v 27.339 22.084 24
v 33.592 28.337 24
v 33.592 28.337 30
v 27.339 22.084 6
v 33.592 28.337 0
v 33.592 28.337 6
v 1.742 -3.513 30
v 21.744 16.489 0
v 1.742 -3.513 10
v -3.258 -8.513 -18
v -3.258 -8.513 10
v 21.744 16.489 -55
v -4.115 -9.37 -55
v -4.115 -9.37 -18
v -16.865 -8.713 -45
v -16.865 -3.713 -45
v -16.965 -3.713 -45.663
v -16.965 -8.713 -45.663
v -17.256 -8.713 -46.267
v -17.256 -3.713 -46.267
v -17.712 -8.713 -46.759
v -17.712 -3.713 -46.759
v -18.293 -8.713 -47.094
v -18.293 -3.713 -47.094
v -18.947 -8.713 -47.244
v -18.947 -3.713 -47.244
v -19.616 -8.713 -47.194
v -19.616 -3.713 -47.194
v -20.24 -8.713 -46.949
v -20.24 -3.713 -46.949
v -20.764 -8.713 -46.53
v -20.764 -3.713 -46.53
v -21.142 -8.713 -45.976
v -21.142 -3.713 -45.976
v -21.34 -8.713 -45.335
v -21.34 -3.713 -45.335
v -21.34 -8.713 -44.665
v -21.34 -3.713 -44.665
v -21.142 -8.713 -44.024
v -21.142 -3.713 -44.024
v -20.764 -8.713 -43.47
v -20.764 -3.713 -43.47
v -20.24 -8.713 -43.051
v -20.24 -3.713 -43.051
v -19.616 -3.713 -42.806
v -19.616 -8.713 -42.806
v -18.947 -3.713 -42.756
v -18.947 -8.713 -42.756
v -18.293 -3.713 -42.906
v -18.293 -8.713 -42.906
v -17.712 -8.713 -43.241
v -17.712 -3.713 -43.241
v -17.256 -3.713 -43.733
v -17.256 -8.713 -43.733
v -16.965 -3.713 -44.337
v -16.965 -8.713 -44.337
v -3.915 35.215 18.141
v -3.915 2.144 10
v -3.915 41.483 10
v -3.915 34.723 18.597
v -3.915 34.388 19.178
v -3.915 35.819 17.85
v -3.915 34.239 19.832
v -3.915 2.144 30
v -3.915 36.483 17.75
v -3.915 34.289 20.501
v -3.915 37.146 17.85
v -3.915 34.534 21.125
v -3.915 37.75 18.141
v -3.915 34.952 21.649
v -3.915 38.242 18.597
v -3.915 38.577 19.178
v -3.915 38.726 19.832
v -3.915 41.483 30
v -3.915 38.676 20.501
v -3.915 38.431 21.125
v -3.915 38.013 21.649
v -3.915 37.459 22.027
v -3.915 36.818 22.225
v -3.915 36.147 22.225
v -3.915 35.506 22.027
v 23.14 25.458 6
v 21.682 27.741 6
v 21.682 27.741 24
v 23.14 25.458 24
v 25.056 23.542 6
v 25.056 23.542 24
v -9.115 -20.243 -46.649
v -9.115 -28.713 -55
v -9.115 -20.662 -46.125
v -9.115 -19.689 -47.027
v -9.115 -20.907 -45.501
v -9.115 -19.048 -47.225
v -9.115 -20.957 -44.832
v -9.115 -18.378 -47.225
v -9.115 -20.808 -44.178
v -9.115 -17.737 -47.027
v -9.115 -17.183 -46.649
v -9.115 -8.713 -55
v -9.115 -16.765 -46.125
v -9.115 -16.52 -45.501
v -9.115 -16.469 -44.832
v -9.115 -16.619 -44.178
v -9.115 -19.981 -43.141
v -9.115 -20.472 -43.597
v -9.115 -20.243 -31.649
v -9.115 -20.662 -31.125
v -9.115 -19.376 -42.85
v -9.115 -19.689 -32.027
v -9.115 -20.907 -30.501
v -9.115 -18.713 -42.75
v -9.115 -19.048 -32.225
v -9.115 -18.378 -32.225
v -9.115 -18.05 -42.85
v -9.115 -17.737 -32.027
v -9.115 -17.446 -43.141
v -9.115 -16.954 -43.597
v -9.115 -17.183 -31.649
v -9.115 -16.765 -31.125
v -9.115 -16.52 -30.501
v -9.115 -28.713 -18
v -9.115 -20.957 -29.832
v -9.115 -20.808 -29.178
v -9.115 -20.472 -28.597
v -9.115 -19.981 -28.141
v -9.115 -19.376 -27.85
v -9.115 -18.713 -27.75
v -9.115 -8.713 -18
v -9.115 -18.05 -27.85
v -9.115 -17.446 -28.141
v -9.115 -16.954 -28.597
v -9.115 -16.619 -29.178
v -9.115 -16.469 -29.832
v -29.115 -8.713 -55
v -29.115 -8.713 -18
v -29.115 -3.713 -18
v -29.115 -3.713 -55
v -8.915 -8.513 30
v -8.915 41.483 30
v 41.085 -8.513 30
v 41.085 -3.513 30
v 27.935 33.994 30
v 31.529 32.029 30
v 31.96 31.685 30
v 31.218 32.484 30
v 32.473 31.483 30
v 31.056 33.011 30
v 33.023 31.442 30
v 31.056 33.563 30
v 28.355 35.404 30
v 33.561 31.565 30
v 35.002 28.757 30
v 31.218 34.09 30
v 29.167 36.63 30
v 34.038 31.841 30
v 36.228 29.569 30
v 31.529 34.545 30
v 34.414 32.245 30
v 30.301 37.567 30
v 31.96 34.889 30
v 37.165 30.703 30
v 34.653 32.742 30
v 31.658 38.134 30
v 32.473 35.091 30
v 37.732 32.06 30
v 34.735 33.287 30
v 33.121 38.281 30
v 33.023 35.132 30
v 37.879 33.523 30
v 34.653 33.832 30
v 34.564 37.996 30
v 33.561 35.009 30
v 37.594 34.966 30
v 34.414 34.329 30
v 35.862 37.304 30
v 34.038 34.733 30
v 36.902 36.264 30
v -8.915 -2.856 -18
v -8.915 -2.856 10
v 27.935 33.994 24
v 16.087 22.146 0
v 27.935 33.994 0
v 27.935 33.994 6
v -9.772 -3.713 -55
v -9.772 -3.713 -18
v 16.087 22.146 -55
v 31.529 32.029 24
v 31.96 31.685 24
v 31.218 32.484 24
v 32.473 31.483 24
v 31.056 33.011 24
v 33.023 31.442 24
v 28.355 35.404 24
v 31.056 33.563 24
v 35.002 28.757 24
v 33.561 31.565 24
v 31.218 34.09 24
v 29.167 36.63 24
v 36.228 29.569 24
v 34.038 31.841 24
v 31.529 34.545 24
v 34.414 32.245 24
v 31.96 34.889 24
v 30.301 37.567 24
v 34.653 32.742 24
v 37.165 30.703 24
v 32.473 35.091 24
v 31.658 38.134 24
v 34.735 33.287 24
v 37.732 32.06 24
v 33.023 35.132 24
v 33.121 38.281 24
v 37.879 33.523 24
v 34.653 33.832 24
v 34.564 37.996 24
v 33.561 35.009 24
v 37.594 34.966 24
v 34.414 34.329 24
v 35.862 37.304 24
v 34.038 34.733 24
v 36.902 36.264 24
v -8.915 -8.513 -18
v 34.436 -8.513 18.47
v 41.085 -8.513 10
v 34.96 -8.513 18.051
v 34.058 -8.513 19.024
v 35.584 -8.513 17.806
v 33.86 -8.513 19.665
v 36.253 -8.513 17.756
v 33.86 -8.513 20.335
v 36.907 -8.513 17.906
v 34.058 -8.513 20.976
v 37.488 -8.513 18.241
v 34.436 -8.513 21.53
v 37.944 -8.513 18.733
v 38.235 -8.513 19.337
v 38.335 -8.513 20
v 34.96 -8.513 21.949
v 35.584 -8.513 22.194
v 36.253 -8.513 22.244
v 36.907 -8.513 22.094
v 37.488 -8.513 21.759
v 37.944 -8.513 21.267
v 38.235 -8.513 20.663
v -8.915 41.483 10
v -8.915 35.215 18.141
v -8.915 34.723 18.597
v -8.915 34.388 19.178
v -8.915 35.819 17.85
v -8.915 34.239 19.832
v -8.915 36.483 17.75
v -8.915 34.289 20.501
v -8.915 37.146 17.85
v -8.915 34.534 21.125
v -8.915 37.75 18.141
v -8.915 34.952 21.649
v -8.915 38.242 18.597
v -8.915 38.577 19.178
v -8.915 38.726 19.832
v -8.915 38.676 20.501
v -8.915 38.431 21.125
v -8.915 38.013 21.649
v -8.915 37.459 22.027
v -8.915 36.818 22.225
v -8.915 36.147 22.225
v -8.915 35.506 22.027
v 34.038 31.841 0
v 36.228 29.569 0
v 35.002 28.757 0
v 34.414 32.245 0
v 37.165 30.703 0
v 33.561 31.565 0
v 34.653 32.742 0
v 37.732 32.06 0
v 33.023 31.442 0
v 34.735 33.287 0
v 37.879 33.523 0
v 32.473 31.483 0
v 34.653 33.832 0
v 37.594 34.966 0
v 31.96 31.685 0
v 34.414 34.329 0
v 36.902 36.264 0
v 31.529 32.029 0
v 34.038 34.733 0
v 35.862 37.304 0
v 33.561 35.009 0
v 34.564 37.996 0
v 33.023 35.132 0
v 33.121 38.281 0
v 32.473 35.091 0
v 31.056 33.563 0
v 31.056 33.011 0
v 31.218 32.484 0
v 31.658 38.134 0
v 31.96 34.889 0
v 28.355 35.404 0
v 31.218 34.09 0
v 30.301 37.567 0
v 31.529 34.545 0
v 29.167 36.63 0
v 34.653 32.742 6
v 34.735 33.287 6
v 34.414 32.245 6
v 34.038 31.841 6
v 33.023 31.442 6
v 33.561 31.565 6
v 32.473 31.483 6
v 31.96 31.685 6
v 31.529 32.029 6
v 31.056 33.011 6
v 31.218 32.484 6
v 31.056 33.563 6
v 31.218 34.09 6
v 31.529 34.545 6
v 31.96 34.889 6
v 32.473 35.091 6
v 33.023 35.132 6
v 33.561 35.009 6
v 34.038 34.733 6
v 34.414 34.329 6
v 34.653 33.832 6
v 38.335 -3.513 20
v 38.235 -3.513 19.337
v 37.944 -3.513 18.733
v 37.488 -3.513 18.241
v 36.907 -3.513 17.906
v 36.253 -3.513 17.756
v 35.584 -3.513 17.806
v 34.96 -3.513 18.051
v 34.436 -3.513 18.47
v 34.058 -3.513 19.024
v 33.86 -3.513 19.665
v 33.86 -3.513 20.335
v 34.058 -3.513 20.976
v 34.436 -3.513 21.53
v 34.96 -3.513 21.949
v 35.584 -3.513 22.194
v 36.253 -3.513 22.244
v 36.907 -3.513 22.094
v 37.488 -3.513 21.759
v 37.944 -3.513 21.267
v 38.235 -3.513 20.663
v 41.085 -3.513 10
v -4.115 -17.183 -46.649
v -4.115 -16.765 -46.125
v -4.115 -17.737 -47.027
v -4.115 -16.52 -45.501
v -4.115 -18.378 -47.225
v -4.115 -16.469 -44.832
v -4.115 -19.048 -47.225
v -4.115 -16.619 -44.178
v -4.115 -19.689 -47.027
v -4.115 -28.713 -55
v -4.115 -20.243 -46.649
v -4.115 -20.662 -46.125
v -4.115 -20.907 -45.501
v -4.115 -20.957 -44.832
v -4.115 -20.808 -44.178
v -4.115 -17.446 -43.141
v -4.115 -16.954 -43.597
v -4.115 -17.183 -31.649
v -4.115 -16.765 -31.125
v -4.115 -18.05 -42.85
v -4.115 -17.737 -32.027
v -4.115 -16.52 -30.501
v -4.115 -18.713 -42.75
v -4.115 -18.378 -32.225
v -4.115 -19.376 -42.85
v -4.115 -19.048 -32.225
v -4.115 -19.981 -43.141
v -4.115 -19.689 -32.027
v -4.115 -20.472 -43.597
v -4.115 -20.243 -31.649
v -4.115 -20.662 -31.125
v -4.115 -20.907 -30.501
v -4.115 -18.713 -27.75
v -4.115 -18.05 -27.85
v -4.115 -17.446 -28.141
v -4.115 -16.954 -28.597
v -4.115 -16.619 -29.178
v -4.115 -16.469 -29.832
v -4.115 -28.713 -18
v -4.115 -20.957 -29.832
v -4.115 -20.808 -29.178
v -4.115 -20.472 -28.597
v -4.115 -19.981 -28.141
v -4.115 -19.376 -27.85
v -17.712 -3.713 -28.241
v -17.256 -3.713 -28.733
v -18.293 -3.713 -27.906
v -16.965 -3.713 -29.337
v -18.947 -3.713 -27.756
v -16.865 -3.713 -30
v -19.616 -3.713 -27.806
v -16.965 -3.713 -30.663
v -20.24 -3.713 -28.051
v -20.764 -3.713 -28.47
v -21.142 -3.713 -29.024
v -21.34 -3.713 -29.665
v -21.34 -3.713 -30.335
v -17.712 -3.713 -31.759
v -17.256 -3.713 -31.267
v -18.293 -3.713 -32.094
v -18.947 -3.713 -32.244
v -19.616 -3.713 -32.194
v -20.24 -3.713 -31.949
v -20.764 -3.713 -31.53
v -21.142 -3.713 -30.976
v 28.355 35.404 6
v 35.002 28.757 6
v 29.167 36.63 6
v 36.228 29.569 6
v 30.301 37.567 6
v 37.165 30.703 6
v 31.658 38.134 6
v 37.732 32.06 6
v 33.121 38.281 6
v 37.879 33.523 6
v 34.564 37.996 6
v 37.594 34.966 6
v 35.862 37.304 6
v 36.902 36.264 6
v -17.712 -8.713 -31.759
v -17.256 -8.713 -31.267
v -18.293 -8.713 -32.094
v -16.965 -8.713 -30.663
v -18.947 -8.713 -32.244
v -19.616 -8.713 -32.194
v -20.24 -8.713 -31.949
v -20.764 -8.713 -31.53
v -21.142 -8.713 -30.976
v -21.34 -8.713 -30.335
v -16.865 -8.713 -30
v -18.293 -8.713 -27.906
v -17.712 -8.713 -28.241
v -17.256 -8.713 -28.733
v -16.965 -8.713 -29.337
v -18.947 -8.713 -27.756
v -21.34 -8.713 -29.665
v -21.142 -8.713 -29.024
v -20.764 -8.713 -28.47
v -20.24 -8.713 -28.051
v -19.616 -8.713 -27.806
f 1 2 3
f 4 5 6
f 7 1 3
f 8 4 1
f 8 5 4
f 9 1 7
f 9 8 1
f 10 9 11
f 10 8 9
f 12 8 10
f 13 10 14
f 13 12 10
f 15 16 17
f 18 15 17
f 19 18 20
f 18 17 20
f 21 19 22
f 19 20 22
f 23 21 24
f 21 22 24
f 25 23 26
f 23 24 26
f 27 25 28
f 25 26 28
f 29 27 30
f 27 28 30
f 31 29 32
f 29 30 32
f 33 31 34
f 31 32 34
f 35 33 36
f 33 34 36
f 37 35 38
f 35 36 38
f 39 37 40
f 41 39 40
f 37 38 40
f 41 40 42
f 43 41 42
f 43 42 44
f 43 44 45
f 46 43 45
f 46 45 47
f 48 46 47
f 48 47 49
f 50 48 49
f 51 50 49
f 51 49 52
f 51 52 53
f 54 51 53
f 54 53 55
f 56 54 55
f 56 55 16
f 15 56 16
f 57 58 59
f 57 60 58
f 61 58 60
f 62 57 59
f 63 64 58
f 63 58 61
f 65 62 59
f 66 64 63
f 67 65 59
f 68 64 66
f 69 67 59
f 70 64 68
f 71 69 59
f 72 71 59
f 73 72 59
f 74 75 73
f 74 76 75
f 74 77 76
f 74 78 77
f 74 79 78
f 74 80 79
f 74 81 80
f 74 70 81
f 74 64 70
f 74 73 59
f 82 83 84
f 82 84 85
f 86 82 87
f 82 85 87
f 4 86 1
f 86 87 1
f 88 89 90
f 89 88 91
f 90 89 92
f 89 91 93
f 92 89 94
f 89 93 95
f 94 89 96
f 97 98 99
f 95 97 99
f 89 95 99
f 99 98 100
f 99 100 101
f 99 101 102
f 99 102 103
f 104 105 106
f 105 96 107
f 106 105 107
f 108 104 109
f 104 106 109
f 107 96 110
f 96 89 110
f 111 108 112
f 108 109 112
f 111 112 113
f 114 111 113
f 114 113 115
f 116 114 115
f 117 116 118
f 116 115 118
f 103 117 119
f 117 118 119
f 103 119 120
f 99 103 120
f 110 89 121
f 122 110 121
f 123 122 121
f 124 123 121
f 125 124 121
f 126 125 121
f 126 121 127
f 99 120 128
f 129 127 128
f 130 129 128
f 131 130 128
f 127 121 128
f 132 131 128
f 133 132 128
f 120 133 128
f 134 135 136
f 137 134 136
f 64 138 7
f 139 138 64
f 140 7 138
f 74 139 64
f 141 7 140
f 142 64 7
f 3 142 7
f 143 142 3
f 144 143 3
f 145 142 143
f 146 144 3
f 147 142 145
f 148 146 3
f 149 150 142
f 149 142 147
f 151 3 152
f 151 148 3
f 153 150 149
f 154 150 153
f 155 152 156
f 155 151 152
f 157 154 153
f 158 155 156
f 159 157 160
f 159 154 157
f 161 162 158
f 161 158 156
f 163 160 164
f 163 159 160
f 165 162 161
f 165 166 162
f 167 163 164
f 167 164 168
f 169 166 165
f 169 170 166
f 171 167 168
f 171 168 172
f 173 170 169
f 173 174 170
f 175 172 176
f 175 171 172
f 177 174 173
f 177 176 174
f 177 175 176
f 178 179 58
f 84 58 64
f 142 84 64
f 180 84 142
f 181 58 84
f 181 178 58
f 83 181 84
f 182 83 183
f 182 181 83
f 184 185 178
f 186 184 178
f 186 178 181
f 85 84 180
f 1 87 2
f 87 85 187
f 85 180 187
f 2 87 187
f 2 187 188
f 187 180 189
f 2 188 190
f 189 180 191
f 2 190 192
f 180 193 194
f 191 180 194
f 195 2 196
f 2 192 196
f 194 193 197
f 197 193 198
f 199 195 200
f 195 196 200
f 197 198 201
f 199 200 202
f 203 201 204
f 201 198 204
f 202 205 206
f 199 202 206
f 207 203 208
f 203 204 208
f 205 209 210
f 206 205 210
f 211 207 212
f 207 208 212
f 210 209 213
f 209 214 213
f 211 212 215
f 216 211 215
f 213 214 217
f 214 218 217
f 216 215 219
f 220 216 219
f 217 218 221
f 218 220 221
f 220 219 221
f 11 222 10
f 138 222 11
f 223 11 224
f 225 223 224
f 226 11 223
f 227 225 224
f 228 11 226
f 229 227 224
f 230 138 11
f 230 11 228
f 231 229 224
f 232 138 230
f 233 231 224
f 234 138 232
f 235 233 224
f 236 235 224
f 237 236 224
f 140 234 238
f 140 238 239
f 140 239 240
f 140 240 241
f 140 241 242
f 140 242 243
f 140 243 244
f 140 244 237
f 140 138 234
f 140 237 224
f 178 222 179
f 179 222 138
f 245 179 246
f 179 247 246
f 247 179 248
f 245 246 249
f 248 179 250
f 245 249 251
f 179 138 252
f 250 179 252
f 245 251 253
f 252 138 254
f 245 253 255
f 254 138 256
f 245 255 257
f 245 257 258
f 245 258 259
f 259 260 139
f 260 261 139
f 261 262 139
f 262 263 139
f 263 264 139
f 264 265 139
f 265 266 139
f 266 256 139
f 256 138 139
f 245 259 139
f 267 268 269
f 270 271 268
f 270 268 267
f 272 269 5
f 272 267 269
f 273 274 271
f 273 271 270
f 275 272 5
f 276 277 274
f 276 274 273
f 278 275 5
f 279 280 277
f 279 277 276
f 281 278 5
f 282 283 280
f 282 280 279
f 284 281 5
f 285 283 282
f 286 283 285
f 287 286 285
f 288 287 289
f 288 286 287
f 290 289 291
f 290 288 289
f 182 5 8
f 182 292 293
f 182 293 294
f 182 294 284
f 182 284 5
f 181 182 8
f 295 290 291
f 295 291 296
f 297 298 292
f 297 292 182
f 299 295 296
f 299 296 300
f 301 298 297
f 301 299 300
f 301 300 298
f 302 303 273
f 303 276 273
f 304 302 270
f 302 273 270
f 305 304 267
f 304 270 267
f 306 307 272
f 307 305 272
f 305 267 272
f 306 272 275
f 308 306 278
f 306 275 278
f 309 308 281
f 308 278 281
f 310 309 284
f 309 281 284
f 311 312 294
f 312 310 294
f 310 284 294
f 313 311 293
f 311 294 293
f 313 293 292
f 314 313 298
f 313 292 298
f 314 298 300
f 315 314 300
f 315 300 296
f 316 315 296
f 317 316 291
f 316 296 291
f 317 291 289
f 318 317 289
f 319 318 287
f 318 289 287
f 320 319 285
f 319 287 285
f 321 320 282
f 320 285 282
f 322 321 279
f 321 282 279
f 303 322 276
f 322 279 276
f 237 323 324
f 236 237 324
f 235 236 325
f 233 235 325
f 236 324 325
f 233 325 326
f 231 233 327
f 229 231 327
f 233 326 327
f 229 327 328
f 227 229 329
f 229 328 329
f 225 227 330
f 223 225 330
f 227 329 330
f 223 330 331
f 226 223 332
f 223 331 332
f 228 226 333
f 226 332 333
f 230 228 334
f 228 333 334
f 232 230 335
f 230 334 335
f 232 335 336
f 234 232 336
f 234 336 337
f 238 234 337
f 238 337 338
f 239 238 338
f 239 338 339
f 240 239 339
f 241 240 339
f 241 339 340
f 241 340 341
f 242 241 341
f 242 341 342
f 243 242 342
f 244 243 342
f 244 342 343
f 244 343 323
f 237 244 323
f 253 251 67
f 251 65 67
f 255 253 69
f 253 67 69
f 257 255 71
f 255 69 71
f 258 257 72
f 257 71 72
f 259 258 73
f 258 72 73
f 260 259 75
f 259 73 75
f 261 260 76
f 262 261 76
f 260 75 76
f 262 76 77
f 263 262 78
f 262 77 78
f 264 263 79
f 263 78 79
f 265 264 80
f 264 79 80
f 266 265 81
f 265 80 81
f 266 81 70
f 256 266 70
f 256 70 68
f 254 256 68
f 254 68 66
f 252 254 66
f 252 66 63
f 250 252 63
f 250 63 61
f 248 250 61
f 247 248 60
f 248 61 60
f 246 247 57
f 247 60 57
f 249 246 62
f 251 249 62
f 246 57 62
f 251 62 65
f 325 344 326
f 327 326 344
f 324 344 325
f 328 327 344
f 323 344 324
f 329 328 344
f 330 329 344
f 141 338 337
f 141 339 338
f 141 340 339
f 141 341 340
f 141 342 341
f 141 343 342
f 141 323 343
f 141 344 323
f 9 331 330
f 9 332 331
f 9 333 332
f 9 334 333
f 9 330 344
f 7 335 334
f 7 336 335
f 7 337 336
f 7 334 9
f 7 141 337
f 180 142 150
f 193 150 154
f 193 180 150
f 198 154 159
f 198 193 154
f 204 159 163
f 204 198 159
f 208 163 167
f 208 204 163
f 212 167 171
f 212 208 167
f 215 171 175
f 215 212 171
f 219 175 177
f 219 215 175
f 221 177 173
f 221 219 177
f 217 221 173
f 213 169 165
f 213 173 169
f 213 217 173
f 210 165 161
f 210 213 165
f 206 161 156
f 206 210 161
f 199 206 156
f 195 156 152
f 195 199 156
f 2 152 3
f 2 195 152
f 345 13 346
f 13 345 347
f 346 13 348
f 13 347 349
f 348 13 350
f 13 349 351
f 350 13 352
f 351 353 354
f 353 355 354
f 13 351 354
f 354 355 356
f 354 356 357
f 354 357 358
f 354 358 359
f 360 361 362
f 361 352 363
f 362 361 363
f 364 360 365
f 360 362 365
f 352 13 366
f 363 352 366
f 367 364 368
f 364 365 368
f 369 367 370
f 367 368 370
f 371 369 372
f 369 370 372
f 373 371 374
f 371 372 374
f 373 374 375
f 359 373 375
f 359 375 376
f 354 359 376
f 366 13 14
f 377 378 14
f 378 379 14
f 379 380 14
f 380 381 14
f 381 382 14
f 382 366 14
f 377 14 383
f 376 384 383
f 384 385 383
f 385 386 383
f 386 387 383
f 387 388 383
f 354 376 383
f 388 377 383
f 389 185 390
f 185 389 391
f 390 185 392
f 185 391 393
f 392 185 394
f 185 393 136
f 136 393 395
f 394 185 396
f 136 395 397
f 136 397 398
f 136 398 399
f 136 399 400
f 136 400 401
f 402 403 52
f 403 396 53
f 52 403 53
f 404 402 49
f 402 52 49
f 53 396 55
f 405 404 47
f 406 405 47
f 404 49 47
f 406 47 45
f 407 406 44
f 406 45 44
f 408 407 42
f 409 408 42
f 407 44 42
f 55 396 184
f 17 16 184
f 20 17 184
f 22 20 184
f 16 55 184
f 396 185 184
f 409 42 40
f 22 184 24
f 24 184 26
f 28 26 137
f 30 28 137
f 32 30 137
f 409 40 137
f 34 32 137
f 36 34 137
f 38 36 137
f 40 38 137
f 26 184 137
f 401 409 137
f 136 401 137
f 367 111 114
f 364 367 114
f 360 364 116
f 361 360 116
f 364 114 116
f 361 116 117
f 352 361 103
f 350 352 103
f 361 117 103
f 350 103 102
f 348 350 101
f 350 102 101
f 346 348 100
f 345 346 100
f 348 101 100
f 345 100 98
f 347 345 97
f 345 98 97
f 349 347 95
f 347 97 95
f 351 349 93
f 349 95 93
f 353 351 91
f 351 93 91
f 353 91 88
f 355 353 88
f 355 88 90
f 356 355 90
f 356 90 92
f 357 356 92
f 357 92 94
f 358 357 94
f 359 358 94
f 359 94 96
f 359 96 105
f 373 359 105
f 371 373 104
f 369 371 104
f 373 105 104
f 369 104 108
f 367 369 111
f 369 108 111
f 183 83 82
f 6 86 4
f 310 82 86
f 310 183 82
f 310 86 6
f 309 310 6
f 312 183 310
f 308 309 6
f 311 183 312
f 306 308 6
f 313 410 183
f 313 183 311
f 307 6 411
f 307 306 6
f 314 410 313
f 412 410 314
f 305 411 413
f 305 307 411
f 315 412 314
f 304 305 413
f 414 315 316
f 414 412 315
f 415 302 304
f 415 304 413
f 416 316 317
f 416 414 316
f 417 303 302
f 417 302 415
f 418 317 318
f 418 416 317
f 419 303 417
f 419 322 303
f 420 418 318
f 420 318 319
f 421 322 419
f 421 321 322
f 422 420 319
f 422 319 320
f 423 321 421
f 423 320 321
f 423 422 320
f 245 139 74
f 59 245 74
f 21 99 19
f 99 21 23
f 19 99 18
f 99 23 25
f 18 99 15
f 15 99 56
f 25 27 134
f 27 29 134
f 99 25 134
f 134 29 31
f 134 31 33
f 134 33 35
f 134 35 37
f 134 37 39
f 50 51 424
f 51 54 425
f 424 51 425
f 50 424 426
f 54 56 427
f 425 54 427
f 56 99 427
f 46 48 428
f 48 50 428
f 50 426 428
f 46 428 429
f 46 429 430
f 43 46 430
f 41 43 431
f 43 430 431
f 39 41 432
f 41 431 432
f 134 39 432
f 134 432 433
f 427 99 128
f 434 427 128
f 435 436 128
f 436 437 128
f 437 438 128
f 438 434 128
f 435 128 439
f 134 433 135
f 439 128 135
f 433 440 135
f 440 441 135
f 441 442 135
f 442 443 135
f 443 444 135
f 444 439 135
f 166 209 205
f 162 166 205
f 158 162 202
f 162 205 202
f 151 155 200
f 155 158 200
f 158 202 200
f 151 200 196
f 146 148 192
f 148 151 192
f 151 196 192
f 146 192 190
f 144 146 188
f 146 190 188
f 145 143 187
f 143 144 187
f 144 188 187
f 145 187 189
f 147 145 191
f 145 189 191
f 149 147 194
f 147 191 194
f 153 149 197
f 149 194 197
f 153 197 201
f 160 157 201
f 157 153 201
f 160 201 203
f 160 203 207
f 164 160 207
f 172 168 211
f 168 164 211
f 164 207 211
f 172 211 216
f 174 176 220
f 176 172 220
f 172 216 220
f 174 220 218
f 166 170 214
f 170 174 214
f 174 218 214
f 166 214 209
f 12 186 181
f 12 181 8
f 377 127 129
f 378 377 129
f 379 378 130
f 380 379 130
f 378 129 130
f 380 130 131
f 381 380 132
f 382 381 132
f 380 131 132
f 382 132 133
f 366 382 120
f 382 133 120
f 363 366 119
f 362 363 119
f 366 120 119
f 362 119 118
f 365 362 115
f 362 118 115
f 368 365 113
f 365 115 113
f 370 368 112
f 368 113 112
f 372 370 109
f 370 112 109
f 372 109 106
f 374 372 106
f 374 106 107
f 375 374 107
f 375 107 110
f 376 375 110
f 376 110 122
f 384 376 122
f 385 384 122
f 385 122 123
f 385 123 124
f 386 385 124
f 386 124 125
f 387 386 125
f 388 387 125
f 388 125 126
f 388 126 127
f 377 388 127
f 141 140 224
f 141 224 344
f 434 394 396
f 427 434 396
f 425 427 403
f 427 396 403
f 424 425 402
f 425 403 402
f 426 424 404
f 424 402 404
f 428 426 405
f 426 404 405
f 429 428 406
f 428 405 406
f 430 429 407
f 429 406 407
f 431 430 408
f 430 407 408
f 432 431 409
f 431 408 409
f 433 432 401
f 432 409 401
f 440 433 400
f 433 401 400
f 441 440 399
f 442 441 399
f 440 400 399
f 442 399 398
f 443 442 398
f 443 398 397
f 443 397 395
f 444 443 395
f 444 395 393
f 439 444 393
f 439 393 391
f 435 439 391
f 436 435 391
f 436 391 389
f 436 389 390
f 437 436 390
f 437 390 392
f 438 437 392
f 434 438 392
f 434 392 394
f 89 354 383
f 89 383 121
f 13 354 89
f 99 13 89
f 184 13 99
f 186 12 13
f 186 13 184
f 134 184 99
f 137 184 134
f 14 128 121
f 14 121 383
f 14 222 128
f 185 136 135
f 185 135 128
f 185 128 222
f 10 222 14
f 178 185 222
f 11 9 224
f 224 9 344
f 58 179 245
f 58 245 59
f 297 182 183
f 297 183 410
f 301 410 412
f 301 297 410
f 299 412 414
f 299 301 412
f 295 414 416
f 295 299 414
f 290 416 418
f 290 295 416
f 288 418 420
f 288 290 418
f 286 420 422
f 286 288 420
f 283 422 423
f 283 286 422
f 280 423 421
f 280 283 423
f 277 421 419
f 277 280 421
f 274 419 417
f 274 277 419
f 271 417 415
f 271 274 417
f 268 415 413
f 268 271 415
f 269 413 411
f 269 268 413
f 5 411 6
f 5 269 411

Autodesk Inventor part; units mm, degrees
ref_plane "YZ Plane" through (0, 0, 0) normal (1, 0, 0) x (0, 1, 0)
ref_plane "XZ Plane" through (0, 0, 0) normal (0, 1, 0) x (-1, 0, 0)
sketch "Sketch1" plane through (0, 0, 0) normal (0, 0, 1) x (1, 0, 0)
  line L0 (-9.7719, -3.7131) -> (-29.115, -3.7131)
  line L1 (-29.115, -3.7131) -> (-29.115, -8.7131)
  line L2 (-29.115, -8.7131) -> (-9.115, -8.7131)
  line L3 (-9.115, -8.7131) -> (-9.115, -28.7131)
  line L4 (-9.115, -28.7131) -> (-4.115, -28.7131)
  line L5 (-4.115, -28.7131) -> (-4.115, -9.37)
  line L6 (-9.7719, -3.7131) -> (27.9352, 33.994)
  line L7 (33.5921, 28.3372) -> (-4.115, -9.37)
  circle A0 centre (32.885, 33.2869) radius 1.85
  arc A1 (33.5921, 28.3372) -> (27.9352, 33.994) centre (32.885, 33.2869) ccw
  dimension "d0" = 20
  dimension "d1" = 20
  dimension "d2" = 5
  dimension "d3" = 5
  dimension "d7" = 42
  dimension "d8" = 42
  dimension "d9" = 3.7
  dimension "d18" = 5
  dimension "d19" = 135
  dimension "d67" = 8
extrude "Extrusion1" add sketch "Sketch1" along normal blind 30
ref_plane "Work Plane1" through (0, 0, 24) normal (0, 0, 1) x (1, 0, 0)
sketch "Sketch3" plane through (0, 0, 24) normal (0, 0, 1) x (1, 0, 0)
  circle A0 centre (32.885, 33.2869) radius 1.85 projected
  circle A1 centre (32.885, 33.2869) radius 12.5
  point P0 (0, 0)
  dimension "d13" = 25
extrude "Extrusion3" cut sketch "Sketch3" against normal blind 18
sketch "Sketch5" plane through (0, 0, 0) normal (0, 0, -1) x (-1, 0, 0)
  circle A0 centre (-32.885, 33.2869) radius 1.85 projected
  line L0 (29.115, -8.7131) -> (29.115, -3.7131) projected
  line L1 (29.115, -3.7131) -> (9.7719, -3.7131) projected
  line L2 (9.7719, -3.7131) -> (-27.9352, 33.994) projected
  arc A1 (-27.9352, 33.994) -> (-33.5921, 28.3372) centre (-32.885, 33.2869) ccw projected
  line L3 (-33.5921, 28.3372) -> (4.115, -9.37) projected
  line L4 (4.115, -9.37) -> (4.115, -28.7131) projected
  line L5 (4.115, -28.7131) -> (9.115, -28.7131) projected
  line L6 (9.115, -28.7131) -> (9.115, -8.7131) projected
  line L7 (9.115, -8.7131) -> (29.115, -8.7131) projected
  line L8 (4.115, -9.37) -> (9.7719, -3.7131)
  point P0 (0, 0)
extrude "Extrusion5" add sketch "Sketch5" along normal blind 55
sketch "Sketch8" plane through (-9.115, -28.7131, -55) normal (-1, 0, 0) x (0, 0, 1)
  circle A0 centre (10, 10) radius 2.25
  line L0 (85, 0) -> (0, 0) projected
  line L1 (0, 0) -> (0, 20) projected
  circle A1 centre (25, 10) radius 2.25
  point P0 (55, 28.7131)
  dimension "d40" = 4.5
  dimension "d41" = 10
  dimension "d42" = 10
  dimension "d43" = 4.5
  dimension "d44" = 10
  dimension "d45" = 15
sketch "Sketch9" plane through (-29.115, -3.7131, 30) normal (0, 1, 0) x (1, 0, 0)
  circle A0 centre (10, 75) radius 2.25
  circle A1 centre (10, 60) radius 2.25
  line L0 (0, 85) -> (19.3431, 85) projected
  line L1 (0, 0) -> (0, 85) projected
  point P0 (29.115, 30)
  dimension "d46" = 10
  dimension "d47" = 10
  dimension "d48" = 10
  dimension "d49" = 15
  dimension "d50" = 4.5
  dimension "d51" = 4.5
extrude "Extrusion8" cut sketch "Sketch9" against normal mid plane 20
extrude "Extrusion9" cut sketch "Sketch8" against normal blind 20
sketch "Sketch10" plane through (0, 0, 30) normal (0, 0, 1) x (1, 0, 0)
  line L0 (-10.9341, 2.1461) -> (2.7686, -11.5566)
  line L1 (2.7686, -11.5566) -> (2.7686, -32.7748)
  line L2 (2.7686, -32.7748) -> (-29.9337, -32.7748)
  line L3 (-29.9337, -32.7748) -> (-29.9337, 2.1461)
  line L4 (-29.9337, 2.1461) -> (-10.9341, 2.1461)
  line L5 (-8.915, -8.5131) -> (-0.2749, -8.5131)
  line L6 (-8.915, -8.5131) -> (-8.915, 0.127)
  line L7 (-9.115, -8.7131) -> (-9.115, -28.7131) projected
  point P0 (0, 0)
  point P1 (-4.0828, -4.7053)
  dimension "d56" = 135
  dimension "d65" = 0.2
  dimension "d66" = 0.2
extrude "Extrusion10" cut sketch "Sketch10" against normal blind 48 contours L0 L6 L5 L1 L2 L3 L4
sketch "Sketch12" plane through (0, 0, 30) normal (0, 0, 1) x (1, 0, 0)
  line L0 (-8.915, -8.5131) -> (-3.2582, -8.5131) projected
  line L1 (-3.2582, -8.5131) -> (-8.915, -8.5131)
  line L2 (-8.915, -8.5131) -> (-8.915, 41.4826)
  line L3 (-8.915, 41.4826) -> (-3.915, 41.4826)
  line L4 (-8.915, -2.8562) -> (-8.915, -8.5131) projected
  line L5 (-8.915, -8.5131) -> (41.085, -8.5131)
  line L6 (41.085, -8.5131) -> (41.085, -3.5131)
  line L7 (41.085, -3.5131) -> (-8.915, -3.5131)
  line L8 (-8.915, -3.5131) -> (-8.915, -8.5131)
  line L9 (-3.915, -8.5131) -> (-3.915, 41.4826)
  point P0 (0, 0)
  point P1 (-8.915, -3.5131)
  point P2 (-3.915, -3.5131)
  dimension "d68" = 5
  dimension "d70" = 50
  dimension "d71" = 50
  dimension "d75" = 0
  dimension "d76" = 5
extrude "Extrusion12" add sketch "Sketch12" against normal blind 20
sketch "Sketch13" plane through (-3.915, 2.1438, 30) normal (1, 0, 0) x (0, 0, -1)
  circle A0 centre (10, 34.3388) radius 2.25
  line L0 (0, 0) -> (0, 39.3388) projected
  line L1 (0, 39.3388) -> (20, 39.3388) projected
  point P0 (30, -2.1438)
  dimension "d77" = 10
  dimension "d78" = 5
  dimension "d79" = 4.5
sketch "Sketch14" plane through (1.7418, -3.5131, 30) normal (0, 1, 0) x (1, 0, 0)
  circle A0 centre (34.3431, 10) radius 2.25
  line L0 (39.3431, 0) -> (39.3431, 20) projected
  line L1 (39.3431, 0) -> (0, 0) projected
  point P0 (-1.7418, 30)
  dimension "d80" = 5
  dimension "d81" = 4.5
  dimension "d82" = 10
extrude "Extrusion13" cut sketch "Sketch13" against normal blind 20
extrude "Extrusion14" cut sketch "Sketch14" against normal blind 20
sketch "Sketch15" plane through (0, 0, -55) normal (0, 0, -1) x (-1, 0, 0)
  line L0 (-27.9352, 33.994) -> (3.915, 2.1438) projected
  line L1 (-16.0867, 22.1455) -> (-21.7436, 16.4887)
  line L2 (-1.7418, -3.5131) -> (-33.5921, 28.3372) projected
  line L3 (-24.5175, 13.7148) -> (-29.4962, 12.412)
  circle A0 centre (-32.885, 33.2869) radius 1.85 projected
  line L4 (29.115, -8.7131) -> (29.115, -3.7131) projected
  line L5 (29.115, -3.7131) -> (9.7719, -3.7131) projected
  line L6 (9.7719, -3.7131) -> (-27.9352, 33.994) projected
  arc A1 (-27.9352, 33.994) -> (-33.5921, 28.3372) centre (-32.885, 33.2869) ccw projected
  line L7 (-33.5921, 28.3372) -> (4.115, -9.37) projected
  line L8 (4.115, -9.37) -> (4.115, -28.7131) projected
  line L9 (4.115, -28.7131) -> (9.115, -28.7131) projected
  line L10 (9.115, -28.7131) -> (9.115, -8.7131) projected
  line L11 (9.115, -8.7131) -> (29.115, -8.7131) projected
  point P0 (0, 0)
extrude "Extrusion15" cut sketch "Sketch15" against normal blind 55 contours L0 L1 L2 A1
equation "\"d8\" = d7"
equation "\"d43\" = d40"
equation "\"d44\" = d41"
equation "\"d71\" = d70"
equation "\"RodDiameter\" = 8"
equation "\"VerticalBearingOD\" = 16"
equation "\"PrintingClearance\" = 0.2"
equation "\"TubeID\" = 18"
equation "\"XLinearBearingOD\" = 19"
properties part number "PulleyHolderXY" material "PET Plastic"
